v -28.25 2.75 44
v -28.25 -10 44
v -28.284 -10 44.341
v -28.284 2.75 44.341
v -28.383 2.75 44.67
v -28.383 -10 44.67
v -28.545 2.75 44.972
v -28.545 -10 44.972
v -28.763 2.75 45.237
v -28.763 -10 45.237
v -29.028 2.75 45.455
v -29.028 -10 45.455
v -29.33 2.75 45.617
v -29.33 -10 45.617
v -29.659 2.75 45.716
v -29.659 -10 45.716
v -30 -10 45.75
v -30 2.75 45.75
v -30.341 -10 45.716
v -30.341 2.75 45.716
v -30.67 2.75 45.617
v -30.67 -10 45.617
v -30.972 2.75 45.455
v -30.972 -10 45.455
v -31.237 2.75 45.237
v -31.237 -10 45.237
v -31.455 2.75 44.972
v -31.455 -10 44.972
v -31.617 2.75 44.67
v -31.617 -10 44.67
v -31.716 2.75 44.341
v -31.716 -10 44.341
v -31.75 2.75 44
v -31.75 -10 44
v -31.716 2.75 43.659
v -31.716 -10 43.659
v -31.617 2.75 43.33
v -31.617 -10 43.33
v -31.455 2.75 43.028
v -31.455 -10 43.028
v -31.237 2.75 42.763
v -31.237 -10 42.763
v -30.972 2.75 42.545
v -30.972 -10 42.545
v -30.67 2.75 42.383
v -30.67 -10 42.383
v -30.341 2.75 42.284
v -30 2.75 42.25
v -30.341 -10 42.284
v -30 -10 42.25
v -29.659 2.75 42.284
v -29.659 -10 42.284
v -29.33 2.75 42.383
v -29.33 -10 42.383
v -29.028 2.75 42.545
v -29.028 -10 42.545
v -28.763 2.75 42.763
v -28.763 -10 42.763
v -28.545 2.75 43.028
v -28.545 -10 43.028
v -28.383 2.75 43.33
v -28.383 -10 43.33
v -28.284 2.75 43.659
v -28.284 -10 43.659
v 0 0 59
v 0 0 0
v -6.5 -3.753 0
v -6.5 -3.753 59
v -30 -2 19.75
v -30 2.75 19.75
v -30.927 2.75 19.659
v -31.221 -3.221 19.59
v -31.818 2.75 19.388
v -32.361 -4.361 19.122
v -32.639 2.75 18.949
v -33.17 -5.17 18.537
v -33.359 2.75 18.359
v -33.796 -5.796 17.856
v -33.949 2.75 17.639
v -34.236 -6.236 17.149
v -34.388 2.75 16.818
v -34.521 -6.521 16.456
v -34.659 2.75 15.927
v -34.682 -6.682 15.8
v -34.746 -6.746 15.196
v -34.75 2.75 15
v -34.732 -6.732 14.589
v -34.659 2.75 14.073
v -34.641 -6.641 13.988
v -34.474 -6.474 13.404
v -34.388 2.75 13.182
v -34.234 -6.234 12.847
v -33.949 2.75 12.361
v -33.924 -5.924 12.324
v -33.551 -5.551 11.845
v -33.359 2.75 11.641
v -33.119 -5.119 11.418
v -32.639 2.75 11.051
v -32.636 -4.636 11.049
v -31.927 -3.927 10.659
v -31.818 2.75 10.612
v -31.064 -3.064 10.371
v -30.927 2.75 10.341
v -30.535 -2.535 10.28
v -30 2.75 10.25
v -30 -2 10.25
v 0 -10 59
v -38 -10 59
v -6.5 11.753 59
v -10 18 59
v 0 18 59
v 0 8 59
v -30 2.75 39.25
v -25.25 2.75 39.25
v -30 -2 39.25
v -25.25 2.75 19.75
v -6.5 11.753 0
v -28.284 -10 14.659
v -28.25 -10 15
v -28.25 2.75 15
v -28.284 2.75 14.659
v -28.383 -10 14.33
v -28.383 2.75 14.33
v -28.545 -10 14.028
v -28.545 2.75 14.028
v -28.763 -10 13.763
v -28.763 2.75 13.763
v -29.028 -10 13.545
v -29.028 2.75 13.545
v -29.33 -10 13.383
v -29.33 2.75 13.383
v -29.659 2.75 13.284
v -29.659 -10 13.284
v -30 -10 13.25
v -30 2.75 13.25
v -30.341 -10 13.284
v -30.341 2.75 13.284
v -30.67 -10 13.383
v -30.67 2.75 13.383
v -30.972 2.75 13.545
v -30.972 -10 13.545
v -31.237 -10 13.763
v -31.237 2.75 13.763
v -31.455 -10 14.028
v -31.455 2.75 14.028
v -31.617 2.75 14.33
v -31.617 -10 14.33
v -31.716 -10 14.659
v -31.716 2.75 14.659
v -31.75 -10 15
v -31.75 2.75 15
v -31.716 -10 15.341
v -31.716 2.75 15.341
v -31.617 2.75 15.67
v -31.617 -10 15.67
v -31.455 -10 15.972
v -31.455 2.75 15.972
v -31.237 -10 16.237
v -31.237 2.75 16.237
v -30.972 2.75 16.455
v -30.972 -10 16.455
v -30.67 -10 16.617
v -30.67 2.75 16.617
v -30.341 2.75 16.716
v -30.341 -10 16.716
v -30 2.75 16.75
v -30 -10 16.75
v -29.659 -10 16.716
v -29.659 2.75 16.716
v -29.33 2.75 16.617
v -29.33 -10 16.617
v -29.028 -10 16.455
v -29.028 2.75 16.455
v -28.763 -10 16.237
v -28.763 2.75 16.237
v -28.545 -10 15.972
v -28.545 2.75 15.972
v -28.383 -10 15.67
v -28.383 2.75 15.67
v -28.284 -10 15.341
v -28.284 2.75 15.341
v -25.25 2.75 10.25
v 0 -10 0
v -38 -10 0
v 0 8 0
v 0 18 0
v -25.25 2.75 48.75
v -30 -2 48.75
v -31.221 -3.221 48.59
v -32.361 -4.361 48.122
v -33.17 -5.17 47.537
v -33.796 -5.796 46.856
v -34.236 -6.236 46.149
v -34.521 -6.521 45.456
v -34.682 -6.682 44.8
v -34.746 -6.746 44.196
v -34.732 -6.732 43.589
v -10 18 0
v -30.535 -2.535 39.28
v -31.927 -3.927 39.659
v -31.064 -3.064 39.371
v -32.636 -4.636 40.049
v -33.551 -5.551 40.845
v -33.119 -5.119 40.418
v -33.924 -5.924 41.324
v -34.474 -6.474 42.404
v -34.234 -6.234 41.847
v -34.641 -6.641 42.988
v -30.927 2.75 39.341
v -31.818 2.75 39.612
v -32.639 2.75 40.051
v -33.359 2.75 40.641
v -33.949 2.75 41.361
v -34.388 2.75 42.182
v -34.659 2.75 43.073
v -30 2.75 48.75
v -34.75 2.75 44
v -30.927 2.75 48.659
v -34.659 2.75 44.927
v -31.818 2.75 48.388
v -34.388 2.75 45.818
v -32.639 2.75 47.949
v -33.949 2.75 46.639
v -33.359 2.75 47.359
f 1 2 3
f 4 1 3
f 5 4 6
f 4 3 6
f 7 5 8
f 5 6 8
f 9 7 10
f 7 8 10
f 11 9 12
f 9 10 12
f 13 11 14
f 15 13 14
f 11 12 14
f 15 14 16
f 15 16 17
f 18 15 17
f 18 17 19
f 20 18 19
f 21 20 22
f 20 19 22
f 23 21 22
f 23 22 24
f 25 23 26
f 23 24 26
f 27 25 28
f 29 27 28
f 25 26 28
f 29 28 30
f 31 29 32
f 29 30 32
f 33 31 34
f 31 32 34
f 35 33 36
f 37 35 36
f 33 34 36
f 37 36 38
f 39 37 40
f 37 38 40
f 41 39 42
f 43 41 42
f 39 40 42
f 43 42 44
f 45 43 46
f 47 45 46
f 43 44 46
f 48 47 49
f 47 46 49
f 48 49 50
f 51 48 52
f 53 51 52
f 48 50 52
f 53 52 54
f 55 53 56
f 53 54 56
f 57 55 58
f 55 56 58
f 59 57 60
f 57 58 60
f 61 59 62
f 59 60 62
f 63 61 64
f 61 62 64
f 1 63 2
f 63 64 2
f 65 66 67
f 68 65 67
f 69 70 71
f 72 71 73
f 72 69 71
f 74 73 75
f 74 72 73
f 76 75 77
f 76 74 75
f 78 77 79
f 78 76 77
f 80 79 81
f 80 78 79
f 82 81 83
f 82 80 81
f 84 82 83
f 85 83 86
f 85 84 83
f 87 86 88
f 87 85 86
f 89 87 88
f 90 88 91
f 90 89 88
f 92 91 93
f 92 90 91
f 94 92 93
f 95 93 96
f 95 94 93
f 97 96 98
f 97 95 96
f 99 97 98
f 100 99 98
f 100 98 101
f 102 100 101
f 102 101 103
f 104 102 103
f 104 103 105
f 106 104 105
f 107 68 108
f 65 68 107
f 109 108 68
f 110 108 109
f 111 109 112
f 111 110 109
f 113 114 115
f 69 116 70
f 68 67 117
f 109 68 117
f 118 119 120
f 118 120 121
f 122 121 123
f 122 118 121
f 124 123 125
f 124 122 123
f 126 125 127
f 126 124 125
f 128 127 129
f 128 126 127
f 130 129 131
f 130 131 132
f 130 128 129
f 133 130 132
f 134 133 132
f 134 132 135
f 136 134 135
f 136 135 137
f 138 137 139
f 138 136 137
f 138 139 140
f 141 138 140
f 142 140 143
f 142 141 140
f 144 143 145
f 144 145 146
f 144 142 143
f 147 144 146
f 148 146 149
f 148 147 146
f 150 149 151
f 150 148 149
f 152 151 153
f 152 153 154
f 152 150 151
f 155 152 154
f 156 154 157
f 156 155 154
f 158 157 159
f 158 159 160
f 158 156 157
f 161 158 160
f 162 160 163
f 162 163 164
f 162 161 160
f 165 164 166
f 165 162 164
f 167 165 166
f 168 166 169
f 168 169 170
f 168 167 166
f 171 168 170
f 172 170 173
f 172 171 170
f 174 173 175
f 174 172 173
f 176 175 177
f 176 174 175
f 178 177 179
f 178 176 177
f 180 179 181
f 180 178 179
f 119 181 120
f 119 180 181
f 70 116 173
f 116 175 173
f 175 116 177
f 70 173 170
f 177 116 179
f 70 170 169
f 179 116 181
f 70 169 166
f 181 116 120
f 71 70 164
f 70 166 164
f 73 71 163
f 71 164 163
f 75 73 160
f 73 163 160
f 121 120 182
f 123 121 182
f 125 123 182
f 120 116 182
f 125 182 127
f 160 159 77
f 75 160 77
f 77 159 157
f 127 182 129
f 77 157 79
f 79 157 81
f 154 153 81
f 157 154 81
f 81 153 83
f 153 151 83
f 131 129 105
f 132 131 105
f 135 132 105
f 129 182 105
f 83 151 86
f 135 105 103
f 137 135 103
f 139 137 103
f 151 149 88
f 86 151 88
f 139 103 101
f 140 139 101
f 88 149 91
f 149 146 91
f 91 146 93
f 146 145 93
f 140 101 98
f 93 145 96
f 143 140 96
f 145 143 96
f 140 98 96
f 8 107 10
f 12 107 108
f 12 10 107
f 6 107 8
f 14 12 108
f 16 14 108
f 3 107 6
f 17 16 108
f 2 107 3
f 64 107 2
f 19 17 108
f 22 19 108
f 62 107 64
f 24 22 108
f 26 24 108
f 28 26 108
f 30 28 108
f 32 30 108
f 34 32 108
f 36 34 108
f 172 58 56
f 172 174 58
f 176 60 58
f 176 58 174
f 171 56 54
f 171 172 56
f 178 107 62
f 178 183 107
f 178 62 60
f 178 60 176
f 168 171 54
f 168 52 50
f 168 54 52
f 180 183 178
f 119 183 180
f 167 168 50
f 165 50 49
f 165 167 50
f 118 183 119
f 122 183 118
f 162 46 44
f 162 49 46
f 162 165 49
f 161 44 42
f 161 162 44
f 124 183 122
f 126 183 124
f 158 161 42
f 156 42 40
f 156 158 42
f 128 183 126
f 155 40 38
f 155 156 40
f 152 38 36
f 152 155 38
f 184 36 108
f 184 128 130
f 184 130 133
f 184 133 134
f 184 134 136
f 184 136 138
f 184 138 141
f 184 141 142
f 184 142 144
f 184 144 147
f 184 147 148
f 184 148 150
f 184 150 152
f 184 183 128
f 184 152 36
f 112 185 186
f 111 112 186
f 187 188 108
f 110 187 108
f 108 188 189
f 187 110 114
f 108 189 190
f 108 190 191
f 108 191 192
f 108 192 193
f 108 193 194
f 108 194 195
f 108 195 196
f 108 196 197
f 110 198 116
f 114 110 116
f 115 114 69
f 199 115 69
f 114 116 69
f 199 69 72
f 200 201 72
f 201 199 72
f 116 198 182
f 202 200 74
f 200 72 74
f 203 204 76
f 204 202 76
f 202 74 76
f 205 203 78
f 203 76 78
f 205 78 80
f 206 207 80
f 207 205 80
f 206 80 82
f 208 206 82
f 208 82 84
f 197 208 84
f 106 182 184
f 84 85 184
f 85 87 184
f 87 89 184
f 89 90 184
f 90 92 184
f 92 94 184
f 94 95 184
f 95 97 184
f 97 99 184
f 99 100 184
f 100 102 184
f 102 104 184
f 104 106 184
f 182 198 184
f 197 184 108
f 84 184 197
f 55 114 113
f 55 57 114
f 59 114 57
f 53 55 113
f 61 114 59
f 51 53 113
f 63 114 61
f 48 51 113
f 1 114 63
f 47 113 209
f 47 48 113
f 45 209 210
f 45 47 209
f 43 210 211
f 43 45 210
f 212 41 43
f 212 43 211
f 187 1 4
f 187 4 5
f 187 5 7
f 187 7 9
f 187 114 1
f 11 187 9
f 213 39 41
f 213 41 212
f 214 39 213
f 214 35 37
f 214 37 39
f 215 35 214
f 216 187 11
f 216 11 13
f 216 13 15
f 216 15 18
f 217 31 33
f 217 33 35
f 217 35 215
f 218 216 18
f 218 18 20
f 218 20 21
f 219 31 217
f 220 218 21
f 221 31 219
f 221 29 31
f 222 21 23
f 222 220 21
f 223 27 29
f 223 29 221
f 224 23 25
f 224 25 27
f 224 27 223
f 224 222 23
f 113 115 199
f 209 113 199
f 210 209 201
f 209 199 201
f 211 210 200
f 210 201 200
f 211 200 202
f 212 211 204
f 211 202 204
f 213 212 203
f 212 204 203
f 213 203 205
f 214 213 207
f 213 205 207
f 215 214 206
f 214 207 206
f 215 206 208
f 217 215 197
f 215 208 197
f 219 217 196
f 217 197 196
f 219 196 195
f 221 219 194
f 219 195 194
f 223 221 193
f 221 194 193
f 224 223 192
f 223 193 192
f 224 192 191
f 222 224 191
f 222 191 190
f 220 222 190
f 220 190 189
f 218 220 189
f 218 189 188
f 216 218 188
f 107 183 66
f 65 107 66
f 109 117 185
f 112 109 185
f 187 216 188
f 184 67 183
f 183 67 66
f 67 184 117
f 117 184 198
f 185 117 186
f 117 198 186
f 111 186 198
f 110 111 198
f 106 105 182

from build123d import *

# Parameters (mm, degrees)
BOSS_EXTRUDE1_DEPTH = 59
BOSS_EXTRUDE6_DEPTH = 12.75
SKETCH3_14_R        = 1.75
CUT_EXTRUDE3_DEPTH  = 12.75


with BuildPart() as part:
    # Sketch1 → Boss-Extrude1 (new body)
    with BuildSketch(Plane.XY):
        Polygon((0, 8), (0, 18), (-10, 18), (-38, -10), (0, -10), (0, 0), (-6.5, -3.75277675), (-6.5, 11.75277675), align=None)
    extrude(amount=BOSS_EXTRUDE1_DEPTH)

    # Sketch3 → Boss-Extrude6 (add)
    with BuildSketch(Plane.XZ.offset(10)):
        with BuildLine():
            Line((-25.25, 48.75), (-25.25, 39.25))
            Line((-25.25, 39.25), (-30, 39.25))
            ThreePointArc((-30, 39.25), (-34.75, 44), (-30, 48.75))
            Line((-30, 48.75), (-25.25, 48.75))
        make_face()
    boss_extrude6 = extrude(amount=-BOSS_EXTRUDE6_DEPTH)

    # Sketch3<14> → Cut-Extrude3 (cut)
    with BuildSketch(Plane.XZ.offset(10)):
        with Locations((-30, 44)):
            Circle(SKETCH3_14_R)
    cut_extrude3 = extrude(amount=-CUT_EXTRUDE3_DEPTH, mode=Mode.SUBTRACT)

    # Mirror1: Boss-Extrude6, Cut-Extrude3 across plane
    add(boss_extrude6.mirror(Plane.XY.offset(29.5)))
    add(cut_extrude3.mirror(Plane.XY.offset(29.5)), mode=Mode.SUBTRACT)


solid = part.part
